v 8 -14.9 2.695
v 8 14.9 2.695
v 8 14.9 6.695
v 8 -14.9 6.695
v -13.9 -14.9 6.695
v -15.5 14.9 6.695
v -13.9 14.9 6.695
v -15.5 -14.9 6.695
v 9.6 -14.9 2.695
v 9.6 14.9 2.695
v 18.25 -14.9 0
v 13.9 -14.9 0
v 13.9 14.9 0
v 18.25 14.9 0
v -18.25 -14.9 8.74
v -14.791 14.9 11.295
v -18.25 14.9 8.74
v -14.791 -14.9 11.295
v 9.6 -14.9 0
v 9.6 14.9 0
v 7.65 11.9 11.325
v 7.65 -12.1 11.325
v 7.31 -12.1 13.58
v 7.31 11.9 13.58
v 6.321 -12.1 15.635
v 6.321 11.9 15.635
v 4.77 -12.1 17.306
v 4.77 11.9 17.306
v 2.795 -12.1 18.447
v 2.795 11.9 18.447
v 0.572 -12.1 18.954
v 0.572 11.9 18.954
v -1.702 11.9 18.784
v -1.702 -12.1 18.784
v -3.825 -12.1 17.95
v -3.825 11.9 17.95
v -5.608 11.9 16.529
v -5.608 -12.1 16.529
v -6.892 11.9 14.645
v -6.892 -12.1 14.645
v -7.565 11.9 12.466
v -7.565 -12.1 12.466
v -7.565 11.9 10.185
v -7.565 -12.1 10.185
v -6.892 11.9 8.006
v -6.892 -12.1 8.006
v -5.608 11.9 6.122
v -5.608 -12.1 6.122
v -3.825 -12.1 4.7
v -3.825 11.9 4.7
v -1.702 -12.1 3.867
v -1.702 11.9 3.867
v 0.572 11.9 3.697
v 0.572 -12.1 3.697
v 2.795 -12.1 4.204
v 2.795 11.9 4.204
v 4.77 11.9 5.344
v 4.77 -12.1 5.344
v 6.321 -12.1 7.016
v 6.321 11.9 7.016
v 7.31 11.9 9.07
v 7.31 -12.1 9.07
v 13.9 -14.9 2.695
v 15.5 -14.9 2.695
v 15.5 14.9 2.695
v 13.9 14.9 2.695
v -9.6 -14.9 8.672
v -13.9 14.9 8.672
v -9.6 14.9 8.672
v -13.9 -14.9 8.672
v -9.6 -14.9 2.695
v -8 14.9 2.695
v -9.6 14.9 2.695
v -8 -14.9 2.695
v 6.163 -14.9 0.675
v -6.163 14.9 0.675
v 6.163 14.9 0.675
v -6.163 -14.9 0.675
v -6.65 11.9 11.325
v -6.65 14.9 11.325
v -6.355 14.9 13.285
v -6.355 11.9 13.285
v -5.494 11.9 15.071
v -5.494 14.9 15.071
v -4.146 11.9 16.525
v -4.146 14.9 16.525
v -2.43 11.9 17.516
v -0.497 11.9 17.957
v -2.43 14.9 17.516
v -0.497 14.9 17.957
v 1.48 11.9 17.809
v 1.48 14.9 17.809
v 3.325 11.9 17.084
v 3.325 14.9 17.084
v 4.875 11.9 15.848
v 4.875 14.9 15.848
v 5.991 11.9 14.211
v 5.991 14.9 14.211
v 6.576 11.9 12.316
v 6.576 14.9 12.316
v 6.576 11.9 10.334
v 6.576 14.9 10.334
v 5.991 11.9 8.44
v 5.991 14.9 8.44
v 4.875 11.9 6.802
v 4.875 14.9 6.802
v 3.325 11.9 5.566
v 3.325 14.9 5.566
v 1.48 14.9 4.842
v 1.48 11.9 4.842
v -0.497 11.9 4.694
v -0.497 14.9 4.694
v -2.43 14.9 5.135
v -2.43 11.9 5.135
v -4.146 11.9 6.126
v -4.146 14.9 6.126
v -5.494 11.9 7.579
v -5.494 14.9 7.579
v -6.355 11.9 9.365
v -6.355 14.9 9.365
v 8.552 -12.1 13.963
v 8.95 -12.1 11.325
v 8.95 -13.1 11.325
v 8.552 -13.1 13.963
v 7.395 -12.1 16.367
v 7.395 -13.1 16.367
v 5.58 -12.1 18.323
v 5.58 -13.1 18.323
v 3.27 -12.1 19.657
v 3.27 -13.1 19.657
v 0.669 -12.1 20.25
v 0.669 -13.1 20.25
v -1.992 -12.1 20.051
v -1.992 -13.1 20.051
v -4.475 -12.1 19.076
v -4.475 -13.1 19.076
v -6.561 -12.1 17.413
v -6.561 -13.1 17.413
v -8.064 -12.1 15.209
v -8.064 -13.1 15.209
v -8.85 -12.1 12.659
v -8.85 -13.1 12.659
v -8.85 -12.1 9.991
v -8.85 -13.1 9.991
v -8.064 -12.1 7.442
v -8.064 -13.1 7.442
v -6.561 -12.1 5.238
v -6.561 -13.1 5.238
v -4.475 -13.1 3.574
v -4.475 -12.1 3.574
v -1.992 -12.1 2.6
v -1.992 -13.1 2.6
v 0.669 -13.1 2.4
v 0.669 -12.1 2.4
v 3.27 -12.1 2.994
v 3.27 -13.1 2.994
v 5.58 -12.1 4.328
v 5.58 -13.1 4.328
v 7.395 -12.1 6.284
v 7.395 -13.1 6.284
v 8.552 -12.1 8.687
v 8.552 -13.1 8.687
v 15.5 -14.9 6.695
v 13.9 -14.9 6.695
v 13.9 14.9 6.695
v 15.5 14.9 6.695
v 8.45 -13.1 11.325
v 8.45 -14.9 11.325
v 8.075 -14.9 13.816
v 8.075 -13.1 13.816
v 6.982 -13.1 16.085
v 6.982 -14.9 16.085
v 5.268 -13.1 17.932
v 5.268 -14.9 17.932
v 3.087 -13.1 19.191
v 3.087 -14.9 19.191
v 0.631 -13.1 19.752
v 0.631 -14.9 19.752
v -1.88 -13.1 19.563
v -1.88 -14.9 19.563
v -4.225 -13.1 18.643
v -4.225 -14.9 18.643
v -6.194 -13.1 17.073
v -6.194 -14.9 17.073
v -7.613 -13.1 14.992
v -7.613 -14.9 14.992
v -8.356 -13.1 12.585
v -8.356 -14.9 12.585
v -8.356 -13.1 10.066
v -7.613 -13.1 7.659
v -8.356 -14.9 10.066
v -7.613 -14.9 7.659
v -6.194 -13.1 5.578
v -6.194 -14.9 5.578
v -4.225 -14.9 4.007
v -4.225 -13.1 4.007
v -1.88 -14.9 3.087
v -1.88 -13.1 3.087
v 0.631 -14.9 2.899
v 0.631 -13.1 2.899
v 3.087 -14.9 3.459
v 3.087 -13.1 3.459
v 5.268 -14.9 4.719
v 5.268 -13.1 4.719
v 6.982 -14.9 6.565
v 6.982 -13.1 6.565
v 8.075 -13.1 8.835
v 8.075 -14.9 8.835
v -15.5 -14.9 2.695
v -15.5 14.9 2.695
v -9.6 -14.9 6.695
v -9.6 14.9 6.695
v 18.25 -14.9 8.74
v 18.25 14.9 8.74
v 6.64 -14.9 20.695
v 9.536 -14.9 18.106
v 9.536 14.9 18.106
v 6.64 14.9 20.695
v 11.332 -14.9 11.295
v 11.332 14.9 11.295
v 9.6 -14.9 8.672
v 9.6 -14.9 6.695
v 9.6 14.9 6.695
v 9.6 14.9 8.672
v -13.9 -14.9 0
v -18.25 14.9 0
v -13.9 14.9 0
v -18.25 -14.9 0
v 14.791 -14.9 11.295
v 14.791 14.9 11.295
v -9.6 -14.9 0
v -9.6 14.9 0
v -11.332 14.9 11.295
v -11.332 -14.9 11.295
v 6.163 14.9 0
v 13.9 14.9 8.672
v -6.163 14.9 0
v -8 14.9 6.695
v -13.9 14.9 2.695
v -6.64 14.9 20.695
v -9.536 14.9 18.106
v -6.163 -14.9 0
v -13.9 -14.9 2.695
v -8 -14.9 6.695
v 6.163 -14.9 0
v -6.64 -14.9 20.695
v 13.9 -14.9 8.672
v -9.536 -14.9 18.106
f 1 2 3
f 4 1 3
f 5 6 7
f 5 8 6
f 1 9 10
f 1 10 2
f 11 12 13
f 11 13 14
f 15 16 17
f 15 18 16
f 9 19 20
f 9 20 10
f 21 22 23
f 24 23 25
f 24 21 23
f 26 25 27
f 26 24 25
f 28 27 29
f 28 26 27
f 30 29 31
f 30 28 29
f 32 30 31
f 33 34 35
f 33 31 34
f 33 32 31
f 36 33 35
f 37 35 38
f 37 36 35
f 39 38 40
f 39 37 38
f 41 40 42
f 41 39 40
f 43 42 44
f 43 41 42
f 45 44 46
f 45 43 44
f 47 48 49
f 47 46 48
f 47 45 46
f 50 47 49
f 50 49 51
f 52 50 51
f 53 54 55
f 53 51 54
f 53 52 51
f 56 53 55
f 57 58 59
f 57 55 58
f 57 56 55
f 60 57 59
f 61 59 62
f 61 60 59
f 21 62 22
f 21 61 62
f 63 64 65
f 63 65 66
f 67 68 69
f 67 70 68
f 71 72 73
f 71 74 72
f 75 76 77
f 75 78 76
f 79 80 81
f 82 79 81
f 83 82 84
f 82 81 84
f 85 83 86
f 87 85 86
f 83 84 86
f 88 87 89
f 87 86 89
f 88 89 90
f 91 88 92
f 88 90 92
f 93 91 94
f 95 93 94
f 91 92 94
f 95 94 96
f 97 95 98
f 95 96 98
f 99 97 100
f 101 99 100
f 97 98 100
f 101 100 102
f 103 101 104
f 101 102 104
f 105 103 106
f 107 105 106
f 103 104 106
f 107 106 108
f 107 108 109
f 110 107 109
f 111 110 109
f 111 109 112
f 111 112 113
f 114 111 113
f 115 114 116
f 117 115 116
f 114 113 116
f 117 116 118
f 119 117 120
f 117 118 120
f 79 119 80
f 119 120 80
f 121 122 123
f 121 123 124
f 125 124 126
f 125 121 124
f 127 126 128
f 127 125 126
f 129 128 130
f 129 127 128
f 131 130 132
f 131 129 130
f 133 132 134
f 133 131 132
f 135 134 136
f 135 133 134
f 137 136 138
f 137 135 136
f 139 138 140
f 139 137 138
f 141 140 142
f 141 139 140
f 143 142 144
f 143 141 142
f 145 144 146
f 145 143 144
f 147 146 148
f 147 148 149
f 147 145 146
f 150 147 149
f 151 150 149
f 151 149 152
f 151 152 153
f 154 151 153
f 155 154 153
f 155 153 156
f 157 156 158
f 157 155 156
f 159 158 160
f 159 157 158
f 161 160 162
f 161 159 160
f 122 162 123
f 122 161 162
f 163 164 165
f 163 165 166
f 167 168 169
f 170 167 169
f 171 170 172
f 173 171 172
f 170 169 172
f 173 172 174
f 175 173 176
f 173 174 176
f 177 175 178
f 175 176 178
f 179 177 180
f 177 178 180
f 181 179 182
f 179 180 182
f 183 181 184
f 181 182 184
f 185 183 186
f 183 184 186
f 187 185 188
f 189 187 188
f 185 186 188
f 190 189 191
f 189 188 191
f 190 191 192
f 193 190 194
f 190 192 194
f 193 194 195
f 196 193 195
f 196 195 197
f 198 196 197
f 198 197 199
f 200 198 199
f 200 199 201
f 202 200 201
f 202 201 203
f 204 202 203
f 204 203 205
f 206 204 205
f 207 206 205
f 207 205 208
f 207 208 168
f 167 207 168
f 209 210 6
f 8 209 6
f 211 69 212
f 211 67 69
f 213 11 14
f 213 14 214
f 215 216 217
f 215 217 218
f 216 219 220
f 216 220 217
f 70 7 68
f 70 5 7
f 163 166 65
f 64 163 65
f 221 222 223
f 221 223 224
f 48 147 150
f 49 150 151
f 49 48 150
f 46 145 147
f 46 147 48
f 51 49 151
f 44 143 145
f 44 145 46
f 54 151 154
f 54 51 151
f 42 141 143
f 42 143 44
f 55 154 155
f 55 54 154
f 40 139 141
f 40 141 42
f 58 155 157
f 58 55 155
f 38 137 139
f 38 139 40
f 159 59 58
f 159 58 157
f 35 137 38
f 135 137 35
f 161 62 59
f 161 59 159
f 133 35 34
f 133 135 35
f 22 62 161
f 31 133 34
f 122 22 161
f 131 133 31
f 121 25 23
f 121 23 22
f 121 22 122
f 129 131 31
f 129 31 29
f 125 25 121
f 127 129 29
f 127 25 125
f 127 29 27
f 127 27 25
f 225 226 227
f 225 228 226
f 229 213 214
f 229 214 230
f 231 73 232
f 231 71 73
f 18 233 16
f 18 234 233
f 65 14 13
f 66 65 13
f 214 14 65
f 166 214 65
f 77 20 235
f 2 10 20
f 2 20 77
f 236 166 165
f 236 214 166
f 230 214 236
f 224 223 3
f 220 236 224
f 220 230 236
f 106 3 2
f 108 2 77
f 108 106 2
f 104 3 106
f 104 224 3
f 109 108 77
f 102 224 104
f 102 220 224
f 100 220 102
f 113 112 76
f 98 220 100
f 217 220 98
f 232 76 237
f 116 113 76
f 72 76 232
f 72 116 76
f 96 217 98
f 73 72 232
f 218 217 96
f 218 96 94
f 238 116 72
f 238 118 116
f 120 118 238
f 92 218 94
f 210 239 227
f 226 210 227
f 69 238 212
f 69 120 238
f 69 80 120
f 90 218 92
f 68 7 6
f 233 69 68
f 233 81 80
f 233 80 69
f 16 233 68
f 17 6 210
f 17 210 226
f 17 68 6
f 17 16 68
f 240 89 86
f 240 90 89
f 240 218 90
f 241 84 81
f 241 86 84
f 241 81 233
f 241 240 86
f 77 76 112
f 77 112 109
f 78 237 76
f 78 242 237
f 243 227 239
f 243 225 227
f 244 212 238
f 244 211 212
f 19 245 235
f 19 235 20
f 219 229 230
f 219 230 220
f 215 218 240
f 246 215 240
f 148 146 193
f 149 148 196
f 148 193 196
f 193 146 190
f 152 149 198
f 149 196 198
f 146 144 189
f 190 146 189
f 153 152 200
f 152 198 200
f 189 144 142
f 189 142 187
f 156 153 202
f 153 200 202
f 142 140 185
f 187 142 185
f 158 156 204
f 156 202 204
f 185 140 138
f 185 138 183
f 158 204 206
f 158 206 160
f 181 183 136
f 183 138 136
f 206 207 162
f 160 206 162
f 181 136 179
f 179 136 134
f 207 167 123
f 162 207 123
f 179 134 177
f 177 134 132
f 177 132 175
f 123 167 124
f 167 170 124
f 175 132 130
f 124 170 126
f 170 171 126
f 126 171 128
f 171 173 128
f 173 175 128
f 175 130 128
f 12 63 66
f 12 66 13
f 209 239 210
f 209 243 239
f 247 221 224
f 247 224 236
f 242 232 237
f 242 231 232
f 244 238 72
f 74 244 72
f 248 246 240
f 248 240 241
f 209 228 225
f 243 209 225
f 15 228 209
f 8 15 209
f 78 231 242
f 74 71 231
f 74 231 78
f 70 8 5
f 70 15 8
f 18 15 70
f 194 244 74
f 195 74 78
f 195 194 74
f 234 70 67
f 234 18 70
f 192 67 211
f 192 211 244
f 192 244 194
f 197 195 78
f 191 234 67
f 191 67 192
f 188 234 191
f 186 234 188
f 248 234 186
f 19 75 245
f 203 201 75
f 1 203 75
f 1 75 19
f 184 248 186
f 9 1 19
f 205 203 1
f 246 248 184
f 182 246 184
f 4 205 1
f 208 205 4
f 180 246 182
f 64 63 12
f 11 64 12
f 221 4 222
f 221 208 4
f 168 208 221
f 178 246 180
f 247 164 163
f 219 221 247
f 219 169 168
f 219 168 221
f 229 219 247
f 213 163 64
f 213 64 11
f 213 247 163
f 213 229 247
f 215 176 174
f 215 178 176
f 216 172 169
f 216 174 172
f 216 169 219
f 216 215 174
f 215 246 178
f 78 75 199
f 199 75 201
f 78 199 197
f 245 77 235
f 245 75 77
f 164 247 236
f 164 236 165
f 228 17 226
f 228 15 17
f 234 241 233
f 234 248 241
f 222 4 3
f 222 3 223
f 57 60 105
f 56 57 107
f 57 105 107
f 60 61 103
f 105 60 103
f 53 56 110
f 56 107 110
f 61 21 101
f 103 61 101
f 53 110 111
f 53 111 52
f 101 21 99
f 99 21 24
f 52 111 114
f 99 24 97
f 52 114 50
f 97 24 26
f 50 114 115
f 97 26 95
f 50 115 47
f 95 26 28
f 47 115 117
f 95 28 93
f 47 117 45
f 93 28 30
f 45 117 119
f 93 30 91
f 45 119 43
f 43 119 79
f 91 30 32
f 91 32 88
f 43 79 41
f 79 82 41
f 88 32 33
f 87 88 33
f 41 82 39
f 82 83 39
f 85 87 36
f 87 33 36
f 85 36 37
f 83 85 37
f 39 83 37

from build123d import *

# Parameters (mm, degrees)
F0_R     = 7.65
F1_DEPTH = 14.9
F3_R     = 8.95
F4_DEPTH = 1
F5_R     = 7.65
F5_R_2   = 6.65
F6_DEPTH = 3
F7_R     = 8.45
F8_DEPTH = 2.8


with BuildPart() as f1:
    # F0 (on Front) → F1 (new body, symmetric)
    with BuildSketch(Plane.XZ):
        Polygon((6.1629465781, 0.6753290654), (6.1629465781, 0), (9.6, 0), (9.6, 2.6953140035), (8, 2.6953140035), (8, 6.6953140035), (9.6, 6.6953140035), (9.6, 8.6722822437), (13.9, 8.6722822437), (13.9, 6.6953140035), (15.5, 6.6953140035), (15.5, 2.6953140035), (13.9, 2.6953140035), (13.9, 0), (18.25, 0), (18.25, 8.7399063632), (14.7912298739, 11.2948538736), (11.3324597478, 11.2948538736), (9.5360150372, 18.1063750603), (6.6399620846, 20.6953901798), (0, 20.6953901798), (-6.6399620846, 20.6953901798), (-9.5360150372, 18.1063750603), (-11.3324597478, 11.2948538736), (-14.7912298739, 11.2948538736), (-18.25, 8.7399063632), (-18.25, 0), (-13.9, 0), (-13.9, 2.6953140035), (-15.5, 2.6953140035), (-15.5, 6.6953140035), (-13.9, 6.6953140035), (-13.9, 8.6722822437), (-9.6, 8.6722822437), (-9.6, 6.6953140035), (-8, 6.6953140035), (-8, 2.6953140035), (-9.6, 2.6953140035), (-9.6, 0), (-6.1629465781, 0), (-6.1629465781, 0.6753290654), (0, 0.6753290654), align=None)
        with Locations((0, 11.3253290654)):
            Circle(F0_R, mode=Mode.SUBTRACT)
    extrude(amount=F1_DEPTH, both=True)

    # F3 (on offset) → F4 (cut)
    with BuildSketch(Plane.XZ.offset(12.1)):
        with Locations((0, 11.3253290654)):
            Circle(F3_R)
    extrude(amount=F4_DEPTH, mode=Mode.SUBTRACT)

    # F5 (on face) → F6 (join)
    with BuildSketch(Plane(origin=(0, 14.9, 0), x_dir=(-1, 0, 0), z_dir=(0, 1, 0))):
        with Locations((0, 11.3253290654)):
            Circle(F5_R)
        with Locations((0, 11.3253290654)):
            Circle(F5_R_2, mode=Mode.SUBTRACT)
    extrude(amount=-F6_DEPTH)

    # F7 (on face) → F8 (cut, through all)
    with BuildSketch(Plane.XZ.offset(14.9)):
        with Locations((0, 11.3253290654)):
            Circle(F7_R)
    extrude(amount=-F8_DEPTH, mode=Mode.SUBTRACT)


solid = f1.part
